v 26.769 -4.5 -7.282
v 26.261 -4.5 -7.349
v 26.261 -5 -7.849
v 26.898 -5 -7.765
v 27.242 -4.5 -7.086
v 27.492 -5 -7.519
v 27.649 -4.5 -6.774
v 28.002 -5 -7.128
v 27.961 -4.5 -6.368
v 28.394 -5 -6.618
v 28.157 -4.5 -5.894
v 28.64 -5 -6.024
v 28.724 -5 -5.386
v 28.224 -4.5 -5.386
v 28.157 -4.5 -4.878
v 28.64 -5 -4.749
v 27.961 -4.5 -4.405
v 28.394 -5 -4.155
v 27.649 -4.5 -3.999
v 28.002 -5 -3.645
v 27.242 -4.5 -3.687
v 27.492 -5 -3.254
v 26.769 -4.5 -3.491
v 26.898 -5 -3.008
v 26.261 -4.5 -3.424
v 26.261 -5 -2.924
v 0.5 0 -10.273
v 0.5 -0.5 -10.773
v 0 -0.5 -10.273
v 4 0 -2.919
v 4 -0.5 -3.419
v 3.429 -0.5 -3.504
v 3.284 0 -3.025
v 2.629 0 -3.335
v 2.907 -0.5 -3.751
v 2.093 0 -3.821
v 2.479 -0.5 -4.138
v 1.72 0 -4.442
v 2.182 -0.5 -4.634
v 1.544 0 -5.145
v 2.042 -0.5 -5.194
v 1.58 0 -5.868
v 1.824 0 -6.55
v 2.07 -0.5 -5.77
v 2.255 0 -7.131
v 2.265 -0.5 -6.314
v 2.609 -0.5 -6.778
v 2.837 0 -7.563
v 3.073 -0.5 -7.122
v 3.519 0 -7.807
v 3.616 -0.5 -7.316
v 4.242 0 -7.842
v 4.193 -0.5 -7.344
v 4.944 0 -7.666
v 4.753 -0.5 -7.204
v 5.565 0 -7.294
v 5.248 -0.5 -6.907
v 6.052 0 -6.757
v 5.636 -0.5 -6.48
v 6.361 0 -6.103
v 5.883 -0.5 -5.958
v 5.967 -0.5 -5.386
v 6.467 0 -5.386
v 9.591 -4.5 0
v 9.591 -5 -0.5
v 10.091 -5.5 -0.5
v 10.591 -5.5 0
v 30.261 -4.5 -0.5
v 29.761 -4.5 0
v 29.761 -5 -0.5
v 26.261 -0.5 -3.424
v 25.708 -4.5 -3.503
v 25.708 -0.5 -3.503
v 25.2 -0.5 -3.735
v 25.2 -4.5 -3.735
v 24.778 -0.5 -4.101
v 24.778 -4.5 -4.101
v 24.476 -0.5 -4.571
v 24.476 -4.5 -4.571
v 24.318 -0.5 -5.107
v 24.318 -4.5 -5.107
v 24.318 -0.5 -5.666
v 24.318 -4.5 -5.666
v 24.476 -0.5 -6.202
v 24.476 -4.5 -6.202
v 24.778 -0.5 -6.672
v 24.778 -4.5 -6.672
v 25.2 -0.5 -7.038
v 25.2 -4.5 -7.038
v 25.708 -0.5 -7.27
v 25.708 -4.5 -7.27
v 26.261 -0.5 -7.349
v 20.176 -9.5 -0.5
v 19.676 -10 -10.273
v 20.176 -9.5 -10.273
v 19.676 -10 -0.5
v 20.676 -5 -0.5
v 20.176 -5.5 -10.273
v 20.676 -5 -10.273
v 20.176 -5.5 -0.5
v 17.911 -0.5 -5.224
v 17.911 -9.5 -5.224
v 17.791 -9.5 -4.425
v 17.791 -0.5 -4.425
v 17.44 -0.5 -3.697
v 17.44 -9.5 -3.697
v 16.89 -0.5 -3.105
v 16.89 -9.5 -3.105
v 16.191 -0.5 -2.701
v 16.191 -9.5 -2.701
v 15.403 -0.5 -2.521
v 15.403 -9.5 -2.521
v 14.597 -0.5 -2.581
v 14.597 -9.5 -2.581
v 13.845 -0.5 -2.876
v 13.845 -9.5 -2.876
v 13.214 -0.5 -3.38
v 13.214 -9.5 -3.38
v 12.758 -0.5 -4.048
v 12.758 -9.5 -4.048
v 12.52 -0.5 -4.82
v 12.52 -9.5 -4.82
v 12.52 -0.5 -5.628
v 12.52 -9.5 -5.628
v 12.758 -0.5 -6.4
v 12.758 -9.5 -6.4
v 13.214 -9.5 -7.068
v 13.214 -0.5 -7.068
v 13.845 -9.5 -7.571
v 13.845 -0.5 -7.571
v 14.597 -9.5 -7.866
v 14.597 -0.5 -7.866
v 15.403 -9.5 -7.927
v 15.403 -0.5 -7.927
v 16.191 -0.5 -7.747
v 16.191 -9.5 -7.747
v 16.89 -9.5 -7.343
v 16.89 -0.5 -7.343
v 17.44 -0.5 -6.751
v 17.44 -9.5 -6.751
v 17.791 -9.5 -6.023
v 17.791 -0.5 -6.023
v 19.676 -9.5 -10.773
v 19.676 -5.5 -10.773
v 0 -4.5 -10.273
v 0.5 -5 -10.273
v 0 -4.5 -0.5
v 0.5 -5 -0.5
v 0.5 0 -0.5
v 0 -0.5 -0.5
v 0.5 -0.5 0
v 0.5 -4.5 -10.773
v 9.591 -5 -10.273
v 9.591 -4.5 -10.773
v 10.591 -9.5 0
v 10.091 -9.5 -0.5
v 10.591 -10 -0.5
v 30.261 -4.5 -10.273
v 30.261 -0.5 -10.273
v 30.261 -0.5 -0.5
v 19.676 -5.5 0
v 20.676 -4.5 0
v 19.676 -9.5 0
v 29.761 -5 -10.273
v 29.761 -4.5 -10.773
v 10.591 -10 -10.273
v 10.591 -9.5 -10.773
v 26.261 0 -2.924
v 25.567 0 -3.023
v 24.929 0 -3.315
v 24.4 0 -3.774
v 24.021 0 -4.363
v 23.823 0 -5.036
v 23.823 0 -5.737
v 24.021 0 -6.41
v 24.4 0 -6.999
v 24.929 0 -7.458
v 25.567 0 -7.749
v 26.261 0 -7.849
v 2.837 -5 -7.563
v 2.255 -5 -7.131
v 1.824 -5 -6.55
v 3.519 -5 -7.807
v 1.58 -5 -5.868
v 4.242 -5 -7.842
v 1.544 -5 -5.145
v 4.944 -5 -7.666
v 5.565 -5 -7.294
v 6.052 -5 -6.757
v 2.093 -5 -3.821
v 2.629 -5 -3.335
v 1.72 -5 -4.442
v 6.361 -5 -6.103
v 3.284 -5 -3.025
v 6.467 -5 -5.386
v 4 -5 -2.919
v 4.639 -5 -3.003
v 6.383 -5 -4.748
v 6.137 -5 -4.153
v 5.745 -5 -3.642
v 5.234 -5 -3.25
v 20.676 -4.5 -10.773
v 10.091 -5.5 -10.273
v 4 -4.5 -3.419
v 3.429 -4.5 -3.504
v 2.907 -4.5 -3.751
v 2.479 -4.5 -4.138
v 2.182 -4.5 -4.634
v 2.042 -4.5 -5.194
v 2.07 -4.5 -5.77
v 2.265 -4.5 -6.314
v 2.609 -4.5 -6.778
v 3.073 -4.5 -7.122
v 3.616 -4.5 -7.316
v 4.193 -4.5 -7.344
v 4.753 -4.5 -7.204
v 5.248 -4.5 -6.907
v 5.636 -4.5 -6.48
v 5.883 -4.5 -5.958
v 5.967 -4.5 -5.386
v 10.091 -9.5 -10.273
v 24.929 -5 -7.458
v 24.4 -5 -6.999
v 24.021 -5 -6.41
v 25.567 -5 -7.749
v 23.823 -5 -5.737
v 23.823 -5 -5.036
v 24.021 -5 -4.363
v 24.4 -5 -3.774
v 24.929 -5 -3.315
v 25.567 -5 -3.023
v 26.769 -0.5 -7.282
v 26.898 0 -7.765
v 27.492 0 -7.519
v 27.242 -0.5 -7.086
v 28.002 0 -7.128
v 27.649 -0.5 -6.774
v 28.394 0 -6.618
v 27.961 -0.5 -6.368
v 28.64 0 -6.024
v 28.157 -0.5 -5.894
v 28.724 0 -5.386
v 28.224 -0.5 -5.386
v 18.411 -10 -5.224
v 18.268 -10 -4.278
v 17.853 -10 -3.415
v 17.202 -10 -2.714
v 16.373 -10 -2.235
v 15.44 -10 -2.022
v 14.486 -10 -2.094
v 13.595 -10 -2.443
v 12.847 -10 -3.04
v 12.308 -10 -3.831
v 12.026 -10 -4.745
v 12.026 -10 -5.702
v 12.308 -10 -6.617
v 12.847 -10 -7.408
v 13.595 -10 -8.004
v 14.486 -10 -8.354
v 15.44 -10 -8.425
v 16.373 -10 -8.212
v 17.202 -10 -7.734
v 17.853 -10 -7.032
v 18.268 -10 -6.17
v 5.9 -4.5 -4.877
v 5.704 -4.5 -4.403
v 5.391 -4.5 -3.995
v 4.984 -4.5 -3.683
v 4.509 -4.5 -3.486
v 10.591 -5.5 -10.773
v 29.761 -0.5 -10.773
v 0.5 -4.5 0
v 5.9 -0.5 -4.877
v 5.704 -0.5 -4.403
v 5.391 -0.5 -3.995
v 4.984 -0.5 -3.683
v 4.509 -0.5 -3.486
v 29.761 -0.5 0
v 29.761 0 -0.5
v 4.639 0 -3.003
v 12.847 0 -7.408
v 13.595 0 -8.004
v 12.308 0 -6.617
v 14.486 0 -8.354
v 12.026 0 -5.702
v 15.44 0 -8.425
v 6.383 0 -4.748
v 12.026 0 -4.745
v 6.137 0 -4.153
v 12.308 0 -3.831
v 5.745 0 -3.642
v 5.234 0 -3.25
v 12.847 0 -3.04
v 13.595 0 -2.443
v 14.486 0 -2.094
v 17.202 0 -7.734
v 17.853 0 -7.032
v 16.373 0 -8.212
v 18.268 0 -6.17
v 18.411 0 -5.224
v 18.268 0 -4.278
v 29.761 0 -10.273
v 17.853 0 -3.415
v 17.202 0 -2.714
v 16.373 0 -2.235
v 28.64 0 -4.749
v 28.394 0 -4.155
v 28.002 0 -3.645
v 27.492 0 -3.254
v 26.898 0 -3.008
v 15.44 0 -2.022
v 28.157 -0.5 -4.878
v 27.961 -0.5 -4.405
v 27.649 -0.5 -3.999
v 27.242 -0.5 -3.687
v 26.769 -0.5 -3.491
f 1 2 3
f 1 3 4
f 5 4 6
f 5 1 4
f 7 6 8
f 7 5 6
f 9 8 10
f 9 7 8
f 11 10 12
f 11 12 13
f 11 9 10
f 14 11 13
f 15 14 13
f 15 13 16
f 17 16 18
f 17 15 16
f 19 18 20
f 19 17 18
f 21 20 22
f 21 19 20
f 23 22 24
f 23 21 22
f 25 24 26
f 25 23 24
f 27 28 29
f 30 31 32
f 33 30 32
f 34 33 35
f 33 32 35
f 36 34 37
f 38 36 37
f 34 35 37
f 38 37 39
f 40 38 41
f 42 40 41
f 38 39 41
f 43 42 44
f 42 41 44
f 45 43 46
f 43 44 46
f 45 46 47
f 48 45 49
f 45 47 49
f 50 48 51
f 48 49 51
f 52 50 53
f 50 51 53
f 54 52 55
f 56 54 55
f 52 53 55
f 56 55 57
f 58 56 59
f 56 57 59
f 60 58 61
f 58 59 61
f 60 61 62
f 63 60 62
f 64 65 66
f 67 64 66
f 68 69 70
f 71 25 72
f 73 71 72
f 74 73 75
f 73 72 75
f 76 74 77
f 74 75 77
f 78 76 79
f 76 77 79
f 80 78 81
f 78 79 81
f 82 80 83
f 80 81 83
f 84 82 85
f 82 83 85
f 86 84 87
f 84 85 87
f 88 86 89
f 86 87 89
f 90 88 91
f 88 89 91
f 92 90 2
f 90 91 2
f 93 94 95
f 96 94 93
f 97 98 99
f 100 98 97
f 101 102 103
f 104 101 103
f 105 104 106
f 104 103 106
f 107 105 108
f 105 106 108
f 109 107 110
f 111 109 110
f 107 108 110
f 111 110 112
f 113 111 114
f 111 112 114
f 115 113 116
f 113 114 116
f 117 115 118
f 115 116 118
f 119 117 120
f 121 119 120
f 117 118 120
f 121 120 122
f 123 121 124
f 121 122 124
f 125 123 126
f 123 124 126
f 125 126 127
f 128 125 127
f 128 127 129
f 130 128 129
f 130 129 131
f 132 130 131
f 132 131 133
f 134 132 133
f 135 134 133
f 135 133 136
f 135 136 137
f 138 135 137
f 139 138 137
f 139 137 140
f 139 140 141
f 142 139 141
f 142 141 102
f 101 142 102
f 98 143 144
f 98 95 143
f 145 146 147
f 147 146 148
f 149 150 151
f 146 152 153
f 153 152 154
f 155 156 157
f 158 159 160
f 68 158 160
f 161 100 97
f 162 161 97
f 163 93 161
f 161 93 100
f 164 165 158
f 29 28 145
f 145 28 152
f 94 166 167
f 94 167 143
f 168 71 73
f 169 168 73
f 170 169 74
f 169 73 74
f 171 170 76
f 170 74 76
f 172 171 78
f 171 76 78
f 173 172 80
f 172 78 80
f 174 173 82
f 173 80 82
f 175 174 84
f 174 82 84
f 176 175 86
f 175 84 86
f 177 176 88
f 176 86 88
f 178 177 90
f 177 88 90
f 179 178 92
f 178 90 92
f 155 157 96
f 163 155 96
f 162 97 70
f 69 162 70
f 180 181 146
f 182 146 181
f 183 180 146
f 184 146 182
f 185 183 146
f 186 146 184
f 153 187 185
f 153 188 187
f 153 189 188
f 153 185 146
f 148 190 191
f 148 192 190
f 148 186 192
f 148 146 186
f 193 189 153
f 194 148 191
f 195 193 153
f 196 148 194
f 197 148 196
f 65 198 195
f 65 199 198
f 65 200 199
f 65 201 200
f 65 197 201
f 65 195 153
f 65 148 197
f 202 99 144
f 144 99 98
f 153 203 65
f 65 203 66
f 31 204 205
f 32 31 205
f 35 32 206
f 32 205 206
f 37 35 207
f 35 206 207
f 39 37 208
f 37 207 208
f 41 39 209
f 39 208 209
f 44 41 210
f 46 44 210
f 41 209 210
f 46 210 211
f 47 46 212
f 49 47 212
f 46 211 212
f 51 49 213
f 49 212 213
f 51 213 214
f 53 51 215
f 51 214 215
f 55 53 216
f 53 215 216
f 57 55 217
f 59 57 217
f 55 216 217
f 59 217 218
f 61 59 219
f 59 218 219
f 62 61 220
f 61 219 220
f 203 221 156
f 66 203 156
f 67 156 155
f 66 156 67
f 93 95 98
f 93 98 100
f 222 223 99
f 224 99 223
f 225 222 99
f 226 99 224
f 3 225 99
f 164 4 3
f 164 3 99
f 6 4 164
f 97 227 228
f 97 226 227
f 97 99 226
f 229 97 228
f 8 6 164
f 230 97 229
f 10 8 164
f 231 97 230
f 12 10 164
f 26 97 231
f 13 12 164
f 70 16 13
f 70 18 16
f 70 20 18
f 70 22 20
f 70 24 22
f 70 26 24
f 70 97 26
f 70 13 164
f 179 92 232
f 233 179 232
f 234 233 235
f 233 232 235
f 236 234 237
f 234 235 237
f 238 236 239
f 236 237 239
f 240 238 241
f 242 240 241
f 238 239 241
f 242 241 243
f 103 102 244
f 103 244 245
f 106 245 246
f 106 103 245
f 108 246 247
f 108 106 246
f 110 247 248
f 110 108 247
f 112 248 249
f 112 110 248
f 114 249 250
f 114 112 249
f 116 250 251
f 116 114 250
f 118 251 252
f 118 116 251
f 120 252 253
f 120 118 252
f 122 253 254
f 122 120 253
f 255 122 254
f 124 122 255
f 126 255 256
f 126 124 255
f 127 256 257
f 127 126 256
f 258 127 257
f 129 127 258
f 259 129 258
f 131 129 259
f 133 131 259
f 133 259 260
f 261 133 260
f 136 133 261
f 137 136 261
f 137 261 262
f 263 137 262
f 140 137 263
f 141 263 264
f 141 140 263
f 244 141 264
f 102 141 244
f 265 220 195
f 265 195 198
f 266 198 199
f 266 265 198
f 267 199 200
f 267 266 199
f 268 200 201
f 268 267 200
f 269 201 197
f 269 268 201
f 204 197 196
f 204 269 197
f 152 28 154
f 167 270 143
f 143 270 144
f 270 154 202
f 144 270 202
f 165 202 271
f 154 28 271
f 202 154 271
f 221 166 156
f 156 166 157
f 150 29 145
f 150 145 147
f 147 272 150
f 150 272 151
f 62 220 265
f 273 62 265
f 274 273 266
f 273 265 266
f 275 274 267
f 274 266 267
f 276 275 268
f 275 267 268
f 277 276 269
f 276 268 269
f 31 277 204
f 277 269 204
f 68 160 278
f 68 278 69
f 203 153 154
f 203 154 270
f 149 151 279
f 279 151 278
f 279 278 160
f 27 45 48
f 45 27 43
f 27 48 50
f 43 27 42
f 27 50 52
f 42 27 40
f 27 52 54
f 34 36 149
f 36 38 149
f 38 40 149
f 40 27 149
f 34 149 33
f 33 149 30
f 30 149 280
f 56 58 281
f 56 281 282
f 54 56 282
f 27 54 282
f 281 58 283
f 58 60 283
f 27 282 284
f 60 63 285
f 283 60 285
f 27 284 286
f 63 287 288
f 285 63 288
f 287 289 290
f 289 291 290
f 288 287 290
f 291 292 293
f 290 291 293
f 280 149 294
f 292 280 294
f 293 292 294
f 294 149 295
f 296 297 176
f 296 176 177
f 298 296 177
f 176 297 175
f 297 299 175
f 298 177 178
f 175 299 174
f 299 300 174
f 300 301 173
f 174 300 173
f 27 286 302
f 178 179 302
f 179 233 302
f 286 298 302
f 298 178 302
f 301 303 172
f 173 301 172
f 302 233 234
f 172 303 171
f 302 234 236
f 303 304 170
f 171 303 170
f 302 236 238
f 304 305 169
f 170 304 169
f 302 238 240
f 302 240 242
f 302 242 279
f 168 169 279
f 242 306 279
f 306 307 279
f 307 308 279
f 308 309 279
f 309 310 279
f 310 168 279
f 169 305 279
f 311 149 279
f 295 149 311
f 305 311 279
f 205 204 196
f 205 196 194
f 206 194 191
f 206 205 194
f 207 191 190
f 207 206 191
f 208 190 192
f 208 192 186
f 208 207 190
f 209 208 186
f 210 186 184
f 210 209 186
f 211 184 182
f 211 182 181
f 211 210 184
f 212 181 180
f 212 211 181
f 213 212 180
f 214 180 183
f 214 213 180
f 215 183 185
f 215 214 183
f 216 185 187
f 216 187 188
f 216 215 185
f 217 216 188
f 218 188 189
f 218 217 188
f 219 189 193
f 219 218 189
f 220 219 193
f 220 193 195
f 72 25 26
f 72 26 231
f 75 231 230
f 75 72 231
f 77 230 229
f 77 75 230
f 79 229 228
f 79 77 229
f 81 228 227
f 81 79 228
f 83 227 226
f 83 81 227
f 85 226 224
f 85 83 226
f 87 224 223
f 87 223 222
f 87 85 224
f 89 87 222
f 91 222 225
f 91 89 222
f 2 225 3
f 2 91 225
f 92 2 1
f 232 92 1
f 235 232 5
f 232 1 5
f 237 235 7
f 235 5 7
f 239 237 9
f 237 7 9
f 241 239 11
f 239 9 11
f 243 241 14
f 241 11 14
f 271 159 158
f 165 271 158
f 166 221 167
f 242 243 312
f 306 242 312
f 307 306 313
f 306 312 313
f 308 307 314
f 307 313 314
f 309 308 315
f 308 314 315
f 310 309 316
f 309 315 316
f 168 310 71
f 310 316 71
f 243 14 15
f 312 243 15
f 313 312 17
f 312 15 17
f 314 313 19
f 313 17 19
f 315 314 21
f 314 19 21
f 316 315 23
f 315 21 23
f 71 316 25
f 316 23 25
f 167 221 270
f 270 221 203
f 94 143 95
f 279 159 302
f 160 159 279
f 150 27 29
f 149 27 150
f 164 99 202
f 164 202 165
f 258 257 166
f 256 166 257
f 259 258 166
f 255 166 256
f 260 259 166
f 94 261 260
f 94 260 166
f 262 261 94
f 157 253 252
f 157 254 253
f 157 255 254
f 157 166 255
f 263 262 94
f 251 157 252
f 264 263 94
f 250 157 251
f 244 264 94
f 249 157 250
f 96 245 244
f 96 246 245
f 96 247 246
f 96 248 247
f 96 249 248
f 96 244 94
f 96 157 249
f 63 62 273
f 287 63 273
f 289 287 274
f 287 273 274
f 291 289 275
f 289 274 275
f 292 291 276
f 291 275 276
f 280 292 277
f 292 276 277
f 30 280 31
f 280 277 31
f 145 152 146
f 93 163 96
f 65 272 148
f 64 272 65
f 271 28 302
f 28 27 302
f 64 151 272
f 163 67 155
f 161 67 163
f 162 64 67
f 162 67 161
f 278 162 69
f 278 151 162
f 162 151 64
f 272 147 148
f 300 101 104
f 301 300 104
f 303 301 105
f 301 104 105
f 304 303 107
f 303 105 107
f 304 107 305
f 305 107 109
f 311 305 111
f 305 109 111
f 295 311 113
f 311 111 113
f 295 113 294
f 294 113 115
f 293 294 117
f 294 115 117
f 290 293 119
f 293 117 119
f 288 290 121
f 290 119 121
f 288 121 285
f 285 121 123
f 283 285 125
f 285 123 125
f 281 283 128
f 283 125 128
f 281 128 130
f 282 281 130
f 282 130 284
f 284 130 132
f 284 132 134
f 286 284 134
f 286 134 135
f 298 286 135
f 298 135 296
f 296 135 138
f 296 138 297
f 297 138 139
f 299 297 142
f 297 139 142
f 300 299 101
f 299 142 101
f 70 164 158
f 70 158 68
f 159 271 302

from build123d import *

# Parameters (mm, degrees)
F0_W      = 30.2609670907
F0_H      = 10.7729053125
F1_DEPTH  = 10
F2_W      = 10.0509477779
F2_H      = 10.7729053125
F3_DEPTH  = 5
F4_W      = 10.0912228227
F4_H      = 10.7729053125
F5_DEPTH  = 5
F6_W      = 10.084872134
F6_H      = 10.7729053125
F7_DEPTH  = 5
F8_R      = 2.7105464677
F9_DEPTH  = 25
F11_DEPTH = 25
F13_DEPTH = 25
F14_SIZE  = 0.5


with BuildPart() as f1:
    # F0 (on Front) → F1 (new body)
    with BuildSketch(Plane.XZ):
        with Locations((15.1304835454, -5.3864526562)):
            Rectangle(F0_W, F0_H)
    extrude(amount=F1_DEPTH)

    # F2 (on face) → F3 (join)
    with BuildSketch(Plane.XZ.offset(10)):
        with Locations((5.025473889, -5.3864526562)):
            Rectangle(F2_W, F2_H)
    extrude(amount=-F3_DEPTH)

    # F4 (on face) → F5 (cut)
    with BuildSketch(Plane.XZ.offset(10)):
        with Locations((5.0456114113, -5.3864526562)):
            Rectangle(F4_W, F4_H)
    extrude(amount=-F5_DEPTH, mode=Mode.SUBTRACT)

    # F6 (on face) → F7 (cut)
    with BuildSketch(Plane.XZ.offset(10)):
        with Locations((25.2185310237, -5.3864526562)):
            Rectangle(F6_W, F6_H)
    extrude(amount=-F7_DEPTH, mode=Mode.SUBTRACT)

    # F8 (on face) → F9 (cut)
    with BuildSketch(Plane.XZ.offset(10)):
        with Locations((15.200487338, -5.2238842472)):
            Circle(F8_R)
    extrude(amount=-F9_DEPTH, mode=Mode.SUBTRACT)

    # F10 (on face) → F11 (cut)
    with BuildSketch(Plane.XZ.offset(5)):
        with BuildLine():
            ThreePointArc((5.9674986844, -5.3864526562), (5.3912316617, -3.9952209945), (4, -3.4189539719))
            Line((4, -3.4189539719), (4, -7.3539513406))
            ThreePointArc((4, -7.3539513406), (5.3912316617, -6.7776843179), (5.9674986844, -5.3864526562))
        make_face()
        with BuildLine():
            Line((4, -7.3539513406), (4, -3.4189539719))
            ThreePointArc((4, -3.4189539719), (2.0325013156, -5.3864526562), (4, -7.3539513406))
        make_face()
    extrude(amount=-F11_DEPTH, mode=Mode.SUBTRACT)

    # F12 (on face) → F13 (cut)
    with BuildSketch(Plane.XZ.offset(5)):
        with BuildLine():
            ThreePointArc((28.2237478891, -5.3864526562), (27.6488627033, -3.9985570437), (26.2609670907, -3.4236718578))
            Line((26.2609670907, -3.4236718578), (26.2609670907, -7.3492334546))
            ThreePointArc((26.2609670907, -7.3492334546), (27.6488627033, -6.7743482688), (28.2237478891, -5.3864526562))
        make_face()
        with BuildLine():
            Line((26.2609670907, -7.3492334546), (26.2609670907, -3.4236718578))
            ThreePointArc((26.2609670907, -3.4236718578), (24.2981862923, -5.3864526562), (26.2609670907, -7.3492334546))
        make_face()
    extrude(amount=-F13_DEPTH, mode=Mode.SUBTRACT)

    # F14
    f14_edges = [f1.edges().sort_by_distance(p)[0] for p in [
        (12.489941, -10, -5.223884),
        (24.298186, -5, -5.386453),
        (2.032501, -5, -5.386453),
        (10.091223, -7.5, -10.772905),
        (10.091223, -7.5, 0),
        (10.091223, -10, -5.386453),
        (10.091223, -5, -5.386453),
        (15.130484, 0, -10.772905),
        (30.260967, -2.5, -10.772905),
        (25.218531, -5, -10.772905),
        (20.176095, -7.5, -10.772905),
        (15.133659, -10, -10.772905),
        (5.045611, -5, -10.772905),
        (0, -2.5, -10.772905),
        (0, 0, -5.386453),
        (0, -5, -5.386453),
        (0, -2.5, 0),
        (15.130484, 0, 0),
        (5.045611, -5, 0),
        (15.133659, -10, 0),
        (20.176095, -7.5, 0),
        (25.218531, -5, 0),
        (30.260967, -2.5, 0),
        (20.176095, -10, -5.386453),
        (20.176095, -5, -5.386453),
        (30.260967, 0, -5.386453),
        (30.260967, -5, -5.386453),
        (2.032501, 0, -5.386453),
        (24.298186, 0, -5.386453),
        (12.489941, 0, -5.223884),
    ]]
    chamfer(f14_edges, length=F14_SIZE)


solid = f1.part
